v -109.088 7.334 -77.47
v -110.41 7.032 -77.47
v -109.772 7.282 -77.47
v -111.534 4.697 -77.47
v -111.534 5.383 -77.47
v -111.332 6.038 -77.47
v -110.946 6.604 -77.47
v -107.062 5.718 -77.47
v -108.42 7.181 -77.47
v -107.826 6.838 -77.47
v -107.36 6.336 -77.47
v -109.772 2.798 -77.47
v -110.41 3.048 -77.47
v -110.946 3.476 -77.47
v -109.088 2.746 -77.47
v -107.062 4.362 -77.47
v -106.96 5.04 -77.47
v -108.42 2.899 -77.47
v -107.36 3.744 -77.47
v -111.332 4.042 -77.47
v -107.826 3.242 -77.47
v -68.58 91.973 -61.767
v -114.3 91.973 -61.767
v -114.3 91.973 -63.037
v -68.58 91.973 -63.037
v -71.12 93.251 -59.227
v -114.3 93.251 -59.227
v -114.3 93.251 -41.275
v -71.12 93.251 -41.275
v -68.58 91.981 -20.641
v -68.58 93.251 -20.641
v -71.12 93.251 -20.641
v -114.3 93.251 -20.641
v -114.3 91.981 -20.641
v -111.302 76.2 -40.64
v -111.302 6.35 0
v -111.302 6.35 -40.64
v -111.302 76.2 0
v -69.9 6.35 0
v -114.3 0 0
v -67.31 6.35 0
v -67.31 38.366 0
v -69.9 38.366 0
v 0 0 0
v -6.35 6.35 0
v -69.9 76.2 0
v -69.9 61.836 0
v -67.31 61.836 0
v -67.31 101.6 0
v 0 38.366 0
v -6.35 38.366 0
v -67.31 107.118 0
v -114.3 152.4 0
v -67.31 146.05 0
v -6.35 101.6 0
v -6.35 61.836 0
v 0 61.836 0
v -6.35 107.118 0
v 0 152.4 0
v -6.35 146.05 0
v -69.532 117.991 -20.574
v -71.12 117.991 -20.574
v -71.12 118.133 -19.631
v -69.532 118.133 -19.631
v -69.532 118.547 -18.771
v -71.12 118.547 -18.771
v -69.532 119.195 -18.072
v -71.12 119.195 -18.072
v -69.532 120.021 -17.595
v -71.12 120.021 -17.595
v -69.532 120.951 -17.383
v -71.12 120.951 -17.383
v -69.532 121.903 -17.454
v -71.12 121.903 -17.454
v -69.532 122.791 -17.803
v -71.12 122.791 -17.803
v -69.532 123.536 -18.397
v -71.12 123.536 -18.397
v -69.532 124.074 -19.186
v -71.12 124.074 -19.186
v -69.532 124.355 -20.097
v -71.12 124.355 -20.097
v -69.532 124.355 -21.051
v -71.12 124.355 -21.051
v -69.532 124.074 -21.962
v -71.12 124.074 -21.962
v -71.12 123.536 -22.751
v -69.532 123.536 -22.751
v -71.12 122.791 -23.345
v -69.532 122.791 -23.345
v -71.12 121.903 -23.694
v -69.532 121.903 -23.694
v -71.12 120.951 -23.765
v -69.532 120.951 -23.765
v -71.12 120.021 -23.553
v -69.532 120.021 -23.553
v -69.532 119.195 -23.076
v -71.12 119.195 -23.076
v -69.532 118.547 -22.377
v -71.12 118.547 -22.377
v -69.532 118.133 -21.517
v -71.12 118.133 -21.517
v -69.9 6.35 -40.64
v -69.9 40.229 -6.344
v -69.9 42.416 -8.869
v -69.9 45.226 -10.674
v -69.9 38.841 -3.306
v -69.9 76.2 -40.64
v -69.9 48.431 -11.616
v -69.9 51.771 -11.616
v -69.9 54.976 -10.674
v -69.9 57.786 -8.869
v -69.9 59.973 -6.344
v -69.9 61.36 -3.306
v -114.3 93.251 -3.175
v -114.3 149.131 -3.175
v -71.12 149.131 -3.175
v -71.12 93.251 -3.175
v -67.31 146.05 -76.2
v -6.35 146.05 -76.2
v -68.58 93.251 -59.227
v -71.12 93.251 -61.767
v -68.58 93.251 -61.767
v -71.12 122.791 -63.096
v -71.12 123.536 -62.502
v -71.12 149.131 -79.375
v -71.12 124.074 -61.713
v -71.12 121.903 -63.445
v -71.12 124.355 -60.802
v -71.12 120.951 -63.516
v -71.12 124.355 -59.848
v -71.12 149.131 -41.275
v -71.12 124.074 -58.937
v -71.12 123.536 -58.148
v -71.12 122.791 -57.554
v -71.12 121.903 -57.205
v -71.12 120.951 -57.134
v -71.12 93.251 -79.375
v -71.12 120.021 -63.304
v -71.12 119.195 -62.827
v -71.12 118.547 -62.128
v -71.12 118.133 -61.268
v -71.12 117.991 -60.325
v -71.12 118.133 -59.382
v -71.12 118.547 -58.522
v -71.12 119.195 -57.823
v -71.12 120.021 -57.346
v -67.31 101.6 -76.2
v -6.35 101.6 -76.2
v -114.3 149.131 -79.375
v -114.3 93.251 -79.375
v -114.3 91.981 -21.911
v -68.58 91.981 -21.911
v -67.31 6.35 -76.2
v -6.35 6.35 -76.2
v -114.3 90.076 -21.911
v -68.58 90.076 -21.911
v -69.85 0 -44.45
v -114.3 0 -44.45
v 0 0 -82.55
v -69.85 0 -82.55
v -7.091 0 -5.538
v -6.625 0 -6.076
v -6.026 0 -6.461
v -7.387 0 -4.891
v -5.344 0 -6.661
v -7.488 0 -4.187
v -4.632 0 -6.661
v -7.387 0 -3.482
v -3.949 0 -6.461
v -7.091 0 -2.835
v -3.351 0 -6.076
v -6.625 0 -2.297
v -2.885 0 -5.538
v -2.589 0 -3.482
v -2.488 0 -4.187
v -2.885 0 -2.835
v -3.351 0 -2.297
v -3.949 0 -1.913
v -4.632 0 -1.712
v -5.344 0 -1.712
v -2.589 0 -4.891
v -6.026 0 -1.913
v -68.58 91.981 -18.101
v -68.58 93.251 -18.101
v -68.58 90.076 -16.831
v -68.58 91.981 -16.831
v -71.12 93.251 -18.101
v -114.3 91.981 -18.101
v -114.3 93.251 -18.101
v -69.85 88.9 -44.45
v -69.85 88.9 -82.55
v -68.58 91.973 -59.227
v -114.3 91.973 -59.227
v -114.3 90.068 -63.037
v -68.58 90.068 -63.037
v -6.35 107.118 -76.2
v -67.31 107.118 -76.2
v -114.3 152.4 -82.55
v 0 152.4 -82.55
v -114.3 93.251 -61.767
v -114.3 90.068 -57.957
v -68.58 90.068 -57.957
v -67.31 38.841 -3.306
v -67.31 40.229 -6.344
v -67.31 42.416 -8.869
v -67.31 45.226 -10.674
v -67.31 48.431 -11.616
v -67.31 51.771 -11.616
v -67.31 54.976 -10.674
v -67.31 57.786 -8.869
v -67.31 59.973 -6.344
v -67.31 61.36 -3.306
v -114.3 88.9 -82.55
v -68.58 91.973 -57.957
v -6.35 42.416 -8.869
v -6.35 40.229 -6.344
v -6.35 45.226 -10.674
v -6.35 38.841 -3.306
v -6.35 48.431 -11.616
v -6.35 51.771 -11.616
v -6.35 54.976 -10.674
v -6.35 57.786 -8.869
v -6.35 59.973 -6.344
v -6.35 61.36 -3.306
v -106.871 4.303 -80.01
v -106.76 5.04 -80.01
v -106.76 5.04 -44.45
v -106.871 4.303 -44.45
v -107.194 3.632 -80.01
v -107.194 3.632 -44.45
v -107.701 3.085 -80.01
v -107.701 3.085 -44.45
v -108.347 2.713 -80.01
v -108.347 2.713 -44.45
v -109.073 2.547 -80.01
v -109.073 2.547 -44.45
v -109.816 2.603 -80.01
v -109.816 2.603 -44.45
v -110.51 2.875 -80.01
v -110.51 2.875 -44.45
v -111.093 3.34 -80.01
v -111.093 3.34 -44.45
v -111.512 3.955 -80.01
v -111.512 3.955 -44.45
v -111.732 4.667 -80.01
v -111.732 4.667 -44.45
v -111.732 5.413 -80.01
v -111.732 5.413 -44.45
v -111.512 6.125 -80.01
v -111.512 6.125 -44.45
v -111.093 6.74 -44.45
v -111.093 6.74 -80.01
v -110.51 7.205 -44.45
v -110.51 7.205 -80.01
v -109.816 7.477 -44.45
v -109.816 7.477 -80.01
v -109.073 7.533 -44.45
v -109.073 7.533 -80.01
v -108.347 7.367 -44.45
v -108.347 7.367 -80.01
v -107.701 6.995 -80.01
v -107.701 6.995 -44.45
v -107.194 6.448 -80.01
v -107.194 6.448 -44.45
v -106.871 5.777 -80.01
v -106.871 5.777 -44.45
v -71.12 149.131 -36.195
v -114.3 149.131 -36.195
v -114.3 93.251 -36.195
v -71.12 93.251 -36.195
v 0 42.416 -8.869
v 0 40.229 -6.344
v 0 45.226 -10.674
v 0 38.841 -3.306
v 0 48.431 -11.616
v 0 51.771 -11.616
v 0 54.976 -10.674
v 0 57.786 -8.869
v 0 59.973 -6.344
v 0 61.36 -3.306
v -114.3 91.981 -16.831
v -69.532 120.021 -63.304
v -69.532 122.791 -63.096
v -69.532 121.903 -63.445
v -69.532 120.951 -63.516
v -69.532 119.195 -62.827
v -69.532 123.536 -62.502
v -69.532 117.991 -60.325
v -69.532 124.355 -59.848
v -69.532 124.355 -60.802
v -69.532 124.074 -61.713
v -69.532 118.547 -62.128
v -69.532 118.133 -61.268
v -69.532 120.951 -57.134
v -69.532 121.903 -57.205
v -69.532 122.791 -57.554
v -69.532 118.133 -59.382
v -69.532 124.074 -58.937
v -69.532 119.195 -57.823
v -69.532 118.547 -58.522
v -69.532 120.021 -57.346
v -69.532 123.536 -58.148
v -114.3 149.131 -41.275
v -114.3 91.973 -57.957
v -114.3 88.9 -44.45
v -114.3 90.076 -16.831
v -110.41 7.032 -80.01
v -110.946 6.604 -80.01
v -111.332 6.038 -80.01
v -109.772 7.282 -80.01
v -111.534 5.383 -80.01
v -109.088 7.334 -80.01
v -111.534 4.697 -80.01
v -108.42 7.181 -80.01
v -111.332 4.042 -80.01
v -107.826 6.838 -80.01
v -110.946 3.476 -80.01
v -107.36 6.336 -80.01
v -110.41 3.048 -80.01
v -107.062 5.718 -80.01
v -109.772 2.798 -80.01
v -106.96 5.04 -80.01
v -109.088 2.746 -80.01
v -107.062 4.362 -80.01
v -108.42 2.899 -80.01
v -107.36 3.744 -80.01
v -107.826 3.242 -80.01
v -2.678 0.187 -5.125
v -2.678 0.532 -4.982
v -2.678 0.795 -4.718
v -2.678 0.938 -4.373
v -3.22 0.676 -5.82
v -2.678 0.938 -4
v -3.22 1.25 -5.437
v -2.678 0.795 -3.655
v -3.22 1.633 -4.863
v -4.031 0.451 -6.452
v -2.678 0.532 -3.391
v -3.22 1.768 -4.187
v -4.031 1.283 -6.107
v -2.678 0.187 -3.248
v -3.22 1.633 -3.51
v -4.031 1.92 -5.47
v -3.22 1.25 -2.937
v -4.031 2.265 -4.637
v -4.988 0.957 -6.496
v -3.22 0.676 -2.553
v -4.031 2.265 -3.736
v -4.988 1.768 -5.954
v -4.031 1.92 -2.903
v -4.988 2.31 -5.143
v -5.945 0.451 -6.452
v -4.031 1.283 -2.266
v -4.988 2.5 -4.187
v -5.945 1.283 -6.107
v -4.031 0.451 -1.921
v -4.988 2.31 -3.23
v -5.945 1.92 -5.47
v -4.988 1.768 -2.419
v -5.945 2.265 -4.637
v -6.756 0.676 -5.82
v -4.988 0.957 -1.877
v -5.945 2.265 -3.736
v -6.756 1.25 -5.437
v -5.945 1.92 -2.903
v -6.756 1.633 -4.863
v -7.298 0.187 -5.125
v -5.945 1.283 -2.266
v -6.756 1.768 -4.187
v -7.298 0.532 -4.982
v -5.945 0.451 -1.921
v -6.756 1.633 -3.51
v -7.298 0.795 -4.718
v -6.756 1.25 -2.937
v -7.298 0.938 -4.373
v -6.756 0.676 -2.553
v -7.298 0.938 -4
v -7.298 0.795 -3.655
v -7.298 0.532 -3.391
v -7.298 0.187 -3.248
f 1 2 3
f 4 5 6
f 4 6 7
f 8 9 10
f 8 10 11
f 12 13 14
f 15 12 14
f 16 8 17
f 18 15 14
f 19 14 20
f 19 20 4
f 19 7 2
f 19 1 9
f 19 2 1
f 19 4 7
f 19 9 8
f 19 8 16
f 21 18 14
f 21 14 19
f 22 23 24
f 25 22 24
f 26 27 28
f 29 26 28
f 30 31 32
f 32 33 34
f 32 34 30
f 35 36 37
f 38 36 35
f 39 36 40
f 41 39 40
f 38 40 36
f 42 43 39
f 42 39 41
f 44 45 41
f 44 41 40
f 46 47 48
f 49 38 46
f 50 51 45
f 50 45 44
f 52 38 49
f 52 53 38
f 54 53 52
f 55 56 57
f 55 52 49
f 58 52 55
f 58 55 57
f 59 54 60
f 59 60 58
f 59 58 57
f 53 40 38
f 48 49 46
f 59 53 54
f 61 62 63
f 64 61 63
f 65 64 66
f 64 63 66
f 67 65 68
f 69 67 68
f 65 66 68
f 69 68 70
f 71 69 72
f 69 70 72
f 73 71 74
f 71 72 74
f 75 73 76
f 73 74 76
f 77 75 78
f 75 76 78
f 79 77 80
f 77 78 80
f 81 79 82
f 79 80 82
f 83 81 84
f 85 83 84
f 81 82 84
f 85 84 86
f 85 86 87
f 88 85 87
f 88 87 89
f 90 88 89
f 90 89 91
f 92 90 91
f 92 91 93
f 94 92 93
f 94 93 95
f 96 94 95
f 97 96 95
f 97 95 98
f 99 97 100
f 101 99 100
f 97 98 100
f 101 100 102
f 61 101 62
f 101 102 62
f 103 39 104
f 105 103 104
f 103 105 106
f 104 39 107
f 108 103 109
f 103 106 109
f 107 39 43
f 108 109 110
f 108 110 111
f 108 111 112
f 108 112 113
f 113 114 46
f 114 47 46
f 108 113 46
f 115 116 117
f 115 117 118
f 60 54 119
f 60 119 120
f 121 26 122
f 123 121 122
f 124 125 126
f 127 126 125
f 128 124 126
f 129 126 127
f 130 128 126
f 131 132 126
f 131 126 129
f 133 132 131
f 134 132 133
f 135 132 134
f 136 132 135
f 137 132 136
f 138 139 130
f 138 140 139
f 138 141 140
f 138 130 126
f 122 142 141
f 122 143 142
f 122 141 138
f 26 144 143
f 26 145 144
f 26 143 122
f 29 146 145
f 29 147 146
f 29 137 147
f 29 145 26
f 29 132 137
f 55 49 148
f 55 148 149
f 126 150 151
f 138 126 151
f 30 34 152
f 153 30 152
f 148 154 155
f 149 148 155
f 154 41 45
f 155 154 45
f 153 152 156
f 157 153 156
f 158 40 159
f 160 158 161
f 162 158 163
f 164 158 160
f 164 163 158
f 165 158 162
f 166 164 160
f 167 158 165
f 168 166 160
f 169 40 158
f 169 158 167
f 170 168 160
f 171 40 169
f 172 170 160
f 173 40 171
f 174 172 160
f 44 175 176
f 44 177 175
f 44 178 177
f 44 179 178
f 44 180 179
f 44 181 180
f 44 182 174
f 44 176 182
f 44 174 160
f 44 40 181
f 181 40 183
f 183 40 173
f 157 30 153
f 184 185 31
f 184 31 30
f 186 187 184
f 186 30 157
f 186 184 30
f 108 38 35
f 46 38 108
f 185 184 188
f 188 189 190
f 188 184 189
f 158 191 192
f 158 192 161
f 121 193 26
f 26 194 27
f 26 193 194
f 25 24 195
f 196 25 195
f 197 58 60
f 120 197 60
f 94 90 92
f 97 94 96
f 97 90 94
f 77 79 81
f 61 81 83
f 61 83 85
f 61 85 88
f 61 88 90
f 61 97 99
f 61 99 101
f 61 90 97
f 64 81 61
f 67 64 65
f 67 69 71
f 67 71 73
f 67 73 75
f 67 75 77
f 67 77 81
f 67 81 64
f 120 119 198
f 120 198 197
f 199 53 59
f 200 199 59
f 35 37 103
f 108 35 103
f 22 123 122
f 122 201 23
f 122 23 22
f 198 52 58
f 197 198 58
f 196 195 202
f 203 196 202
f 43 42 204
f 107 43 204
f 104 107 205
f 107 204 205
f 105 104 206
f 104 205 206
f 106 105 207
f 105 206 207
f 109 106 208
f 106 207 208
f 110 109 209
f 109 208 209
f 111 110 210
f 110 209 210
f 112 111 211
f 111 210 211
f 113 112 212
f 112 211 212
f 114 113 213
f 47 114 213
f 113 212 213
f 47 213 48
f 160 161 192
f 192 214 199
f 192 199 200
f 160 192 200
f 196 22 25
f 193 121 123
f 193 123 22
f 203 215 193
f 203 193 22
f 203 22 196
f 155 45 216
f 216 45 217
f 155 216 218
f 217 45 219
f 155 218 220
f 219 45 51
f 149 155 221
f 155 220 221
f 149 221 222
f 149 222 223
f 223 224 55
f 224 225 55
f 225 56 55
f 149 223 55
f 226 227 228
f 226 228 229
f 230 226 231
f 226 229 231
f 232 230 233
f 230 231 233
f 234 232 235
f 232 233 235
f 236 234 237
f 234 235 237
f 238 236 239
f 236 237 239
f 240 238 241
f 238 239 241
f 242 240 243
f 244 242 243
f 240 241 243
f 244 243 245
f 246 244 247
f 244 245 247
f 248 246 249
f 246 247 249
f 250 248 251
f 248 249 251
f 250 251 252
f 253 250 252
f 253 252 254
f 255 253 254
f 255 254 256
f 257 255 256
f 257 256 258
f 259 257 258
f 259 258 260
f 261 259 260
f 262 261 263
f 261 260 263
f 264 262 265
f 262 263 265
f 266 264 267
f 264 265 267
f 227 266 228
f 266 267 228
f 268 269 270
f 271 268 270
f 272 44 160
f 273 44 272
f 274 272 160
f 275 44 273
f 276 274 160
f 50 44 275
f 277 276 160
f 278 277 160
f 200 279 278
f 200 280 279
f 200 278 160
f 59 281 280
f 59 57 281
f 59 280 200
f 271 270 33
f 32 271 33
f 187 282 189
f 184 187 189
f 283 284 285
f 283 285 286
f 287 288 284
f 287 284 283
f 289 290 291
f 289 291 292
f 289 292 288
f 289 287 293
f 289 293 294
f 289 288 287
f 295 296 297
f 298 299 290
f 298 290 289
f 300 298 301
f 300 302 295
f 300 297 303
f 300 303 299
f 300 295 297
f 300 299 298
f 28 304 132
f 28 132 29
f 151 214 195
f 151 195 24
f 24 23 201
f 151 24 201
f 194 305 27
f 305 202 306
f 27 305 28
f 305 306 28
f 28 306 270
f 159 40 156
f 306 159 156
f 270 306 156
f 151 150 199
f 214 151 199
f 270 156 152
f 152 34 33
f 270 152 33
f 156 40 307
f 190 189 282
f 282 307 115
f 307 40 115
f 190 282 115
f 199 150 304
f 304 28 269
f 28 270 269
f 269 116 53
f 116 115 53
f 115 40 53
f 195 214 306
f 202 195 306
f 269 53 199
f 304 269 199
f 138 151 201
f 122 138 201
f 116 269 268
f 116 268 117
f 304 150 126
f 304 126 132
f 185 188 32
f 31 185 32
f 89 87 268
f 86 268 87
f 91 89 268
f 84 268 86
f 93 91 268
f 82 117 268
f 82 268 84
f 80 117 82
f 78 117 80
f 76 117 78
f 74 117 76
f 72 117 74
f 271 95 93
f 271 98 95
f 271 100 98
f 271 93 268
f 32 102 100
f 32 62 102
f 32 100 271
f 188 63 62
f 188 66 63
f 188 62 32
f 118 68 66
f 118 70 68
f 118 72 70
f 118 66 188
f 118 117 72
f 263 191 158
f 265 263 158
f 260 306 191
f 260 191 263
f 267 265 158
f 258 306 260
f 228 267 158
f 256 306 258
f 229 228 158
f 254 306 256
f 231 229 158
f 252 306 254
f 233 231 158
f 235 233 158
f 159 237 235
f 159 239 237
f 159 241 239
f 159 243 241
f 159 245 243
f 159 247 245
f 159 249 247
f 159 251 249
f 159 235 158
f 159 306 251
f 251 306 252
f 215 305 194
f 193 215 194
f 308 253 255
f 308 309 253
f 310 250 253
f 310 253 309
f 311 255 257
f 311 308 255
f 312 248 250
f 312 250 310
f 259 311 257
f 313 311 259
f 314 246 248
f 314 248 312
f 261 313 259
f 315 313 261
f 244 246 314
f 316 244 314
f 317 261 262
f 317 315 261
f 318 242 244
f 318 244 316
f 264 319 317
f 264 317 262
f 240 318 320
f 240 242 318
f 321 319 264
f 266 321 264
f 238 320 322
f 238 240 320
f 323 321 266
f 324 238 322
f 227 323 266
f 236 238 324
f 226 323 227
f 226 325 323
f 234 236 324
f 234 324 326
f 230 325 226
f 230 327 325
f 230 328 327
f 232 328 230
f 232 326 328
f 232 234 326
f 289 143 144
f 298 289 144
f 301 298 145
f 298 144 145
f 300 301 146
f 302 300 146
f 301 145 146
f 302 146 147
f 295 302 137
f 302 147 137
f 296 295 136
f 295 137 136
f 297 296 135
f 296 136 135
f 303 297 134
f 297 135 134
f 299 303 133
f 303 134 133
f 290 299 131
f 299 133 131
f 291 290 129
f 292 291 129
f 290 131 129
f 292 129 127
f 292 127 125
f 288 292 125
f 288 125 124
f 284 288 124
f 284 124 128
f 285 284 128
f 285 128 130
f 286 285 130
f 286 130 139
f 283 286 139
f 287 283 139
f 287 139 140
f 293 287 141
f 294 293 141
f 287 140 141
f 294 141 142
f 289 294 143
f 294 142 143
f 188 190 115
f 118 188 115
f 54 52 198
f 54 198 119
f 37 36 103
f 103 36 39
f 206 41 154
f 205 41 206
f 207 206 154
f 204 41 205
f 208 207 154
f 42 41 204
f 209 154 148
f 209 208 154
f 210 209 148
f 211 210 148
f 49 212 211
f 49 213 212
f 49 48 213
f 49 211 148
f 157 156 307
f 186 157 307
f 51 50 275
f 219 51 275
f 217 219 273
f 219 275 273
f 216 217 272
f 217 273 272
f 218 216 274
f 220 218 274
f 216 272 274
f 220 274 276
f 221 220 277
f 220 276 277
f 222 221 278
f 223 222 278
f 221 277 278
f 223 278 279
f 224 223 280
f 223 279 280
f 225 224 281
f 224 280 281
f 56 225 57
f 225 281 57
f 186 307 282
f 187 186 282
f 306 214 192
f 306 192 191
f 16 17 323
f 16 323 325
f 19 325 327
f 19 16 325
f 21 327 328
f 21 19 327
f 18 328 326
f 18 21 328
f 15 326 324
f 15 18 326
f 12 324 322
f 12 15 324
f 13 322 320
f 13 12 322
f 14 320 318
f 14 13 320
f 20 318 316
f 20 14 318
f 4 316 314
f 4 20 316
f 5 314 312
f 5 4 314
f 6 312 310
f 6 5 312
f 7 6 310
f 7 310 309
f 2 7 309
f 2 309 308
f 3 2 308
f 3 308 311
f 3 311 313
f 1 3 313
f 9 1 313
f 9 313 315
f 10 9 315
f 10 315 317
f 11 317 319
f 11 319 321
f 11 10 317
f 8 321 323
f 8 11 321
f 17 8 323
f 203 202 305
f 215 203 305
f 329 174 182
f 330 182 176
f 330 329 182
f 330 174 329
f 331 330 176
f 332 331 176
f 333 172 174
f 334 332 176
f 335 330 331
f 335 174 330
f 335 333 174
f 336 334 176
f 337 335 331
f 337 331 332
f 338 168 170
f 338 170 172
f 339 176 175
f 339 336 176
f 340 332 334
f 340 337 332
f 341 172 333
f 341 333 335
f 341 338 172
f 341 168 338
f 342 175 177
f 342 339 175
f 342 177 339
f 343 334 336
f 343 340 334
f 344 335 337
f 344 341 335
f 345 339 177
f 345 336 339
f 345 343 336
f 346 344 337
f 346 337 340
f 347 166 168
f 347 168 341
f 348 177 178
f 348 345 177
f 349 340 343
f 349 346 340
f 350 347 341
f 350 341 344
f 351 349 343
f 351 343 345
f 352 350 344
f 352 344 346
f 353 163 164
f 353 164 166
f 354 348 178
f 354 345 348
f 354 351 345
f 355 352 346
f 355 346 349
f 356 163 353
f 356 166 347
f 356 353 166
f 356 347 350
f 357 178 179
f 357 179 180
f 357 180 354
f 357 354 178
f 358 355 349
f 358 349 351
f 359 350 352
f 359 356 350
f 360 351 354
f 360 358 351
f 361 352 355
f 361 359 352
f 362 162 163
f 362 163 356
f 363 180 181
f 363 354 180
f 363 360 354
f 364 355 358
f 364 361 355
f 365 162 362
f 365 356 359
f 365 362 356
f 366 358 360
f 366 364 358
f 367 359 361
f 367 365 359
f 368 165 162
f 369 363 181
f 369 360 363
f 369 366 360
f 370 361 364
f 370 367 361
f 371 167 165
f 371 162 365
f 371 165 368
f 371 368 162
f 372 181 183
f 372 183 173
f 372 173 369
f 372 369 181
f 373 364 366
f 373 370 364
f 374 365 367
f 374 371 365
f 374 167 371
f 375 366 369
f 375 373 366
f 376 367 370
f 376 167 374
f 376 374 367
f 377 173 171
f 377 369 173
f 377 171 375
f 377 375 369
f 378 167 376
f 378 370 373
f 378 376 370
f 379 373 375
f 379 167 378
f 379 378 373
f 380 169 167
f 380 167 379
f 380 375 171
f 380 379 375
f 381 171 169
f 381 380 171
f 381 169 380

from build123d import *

# Parameters (mm, degrees)
F0_W      = 114.3
F0_H      = 152.4
F1_DEPTH  = 82.55
F2_W      = 60.96
F2_H      = 95.25
F3_DEPTH  = 76.2
F4_R      = 11.734963
F5_DEPTH  = 75.184
F6_W      = 60.96
F6_H      = 38.932147
F7_DEPTH  = 76.2
F8_W      = 88.9
F8_H      = 38.1
F9_DEPTH  = 44.45
F10_W     = 55.88
F10_H     = 33.02
F10_H_2   = 38.1
F11_DEPTH = 43.18
F12_R     = 2.5
F13_DEPTH = 33.02
F14_R     = 2.5
F14_R_2   = 2.3
F15_DEPTH = 2.54
F17_DEPTH = 45.72
F19_DEPTH = 45.72
F20_R     = 3.2
F21_DEPTH = 1.5875
F22_W     = 41.402
F22_H     = 69.85
F23_DEPTH = 40.64


with BuildPart() as f1:
    # F0 (on Top) → F1 (new body)
    with BuildSketch(Plane.XY):
        with Locations((-57.15, 76.2)):
            Rectangle(F0_W, F0_H)
    extrude(amount=-F1_DEPTH)

    # F2 (on face) → F3 (cut)
    with BuildSketch(Plane.XY):
        with Locations((-36.83, 53.975)):
            Rectangle(F2_W, F2_H)
    extrude(amount=-F3_DEPTH, mode=Mode.SUBTRACT)

    # F4 (on face) → F5 (cut)
    with BuildSketch(Plane.YZ):
        with Locations((50.100744, 0)):
            Circle(F4_R)
    extrude(amount=-F5_DEPTH, mode=Mode.SUBTRACT)

    # F6 (on face) → F7 (cut)
    with BuildSketch(Plane.XY):
        with Locations((-36.83, 126.583926)):
            Rectangle(F6_W, F6_H)
    extrude(amount=-F7_DEPTH, mode=Mode.SUBTRACT)

    # F8 (on face) → F9 (cut)
    with BuildSketch(Plane(origin=(-114.3, 0, 0), x_dir=(0, -1, 0), z_dir=(-1, 0, 0))):
        with Locations((-44.45, -63.5)):
            Rectangle(F8_W, F8_H)
    extrude(amount=-F9_DEPTH, mode=Mode.SUBTRACT)

    # F10 (on face) → F11 (cut)
    with BuildSketch(Plane(origin=(-114.3, 0, 0), x_dir=(0, -1, 0), z_dir=(-1, 0, 0))):
        with Locations((-121.190508, -19.685)):
            Rectangle(F10_W, F10_H)
        with Locations((-121.190508, -60.325)):
            Rectangle(F10_W, F10_H_2)
    extrude(amount=-F11_DEPTH, mode=Mode.SUBTRACT)

    # F12 (on face) → F13 (join)
    with BuildSketch(Plane(origin=(0, 0, -44.45), x_dir=(1, 0, 0), z_dir=(0, 0, -1))):
        with Locations((-109.26, -5.04)):
            Circle(F12_R)
    extrude(amount=F13_DEPTH)

    # F14 (on face) → F15 (join)
    with BuildSketch(Plane(origin=(0, 0, -77.47), x_dir=(1, 0, 0), z_dir=(0, 0, -1))):
        with Locations((-109.26, -5.04)):
            Circle(F14_R)
        with Locations((-109.26, -5.04)):
            Circle(F14_R_2, mode=Mode.SUBTRACT)
    extrude(amount=F15_DEPTH)

    # F16 (on face) → F17 (cut)
    with BuildSketch(Plane(origin=(-114.3, 0, 0), x_dir=(0, -1, 0), z_dir=(-1, 0, 0))):
        Polygon((-91.980508, -16.831285), (-91.980508, -18.101285), (-93.250508, -18.101285), (-93.250508, -20.641285), (-91.980508, -20.641285), (-91.980508, -21.911285), (-90.075508, -21.911285), (-90.075508, -16.831285), align=None)
    extrude(amount=-F17_DEPTH, mode=Mode.SUBTRACT)

    # F18 (on face) → F19 (cut)
    with BuildSketch(Plane(origin=(-114.3, 0, 0), x_dir=(0, -1, 0), z_dir=(-1, 0, 0))):
        Polygon((-91.973217, -57.956658), (-91.973217, -59.226658), (-93.250508, -59.226658), (-93.250508, -61.766658), (-91.973217, -61.766658), (-91.973217, -63.036658), (-90.068217, -63.036658), (-90.068217, -57.956658), align=None)
    extrude(amount=-F19_DEPTH, mode=Mode.SUBTRACT)

    # F20 (on face) → F21 (cut)
    with BuildSketch(Plane(origin=(-71.12, 0, 0), x_dir=(0, -1, 0), z_dir=(-1, 0, 0))):
        with Locations((-121.190508, -20.574)):
            Circle(F20_R)
        with Locations((-121.190508, -60.325)):
            Circle(F20_R)
    extrude(amount=-F21_DEPTH, mode=Mode.SUBTRACT)

    # F22 (on face) → F23 (cut)
    with BuildSketch(Plane.XY):
        with Locations((-90.600921, 41.275)):
            Rectangle(F22_W, F22_H)
    extrude(amount=-F23_DEPTH, mode=Mode.SUBTRACT)

    # F24 (on face) → F25 (revolve, cut)
    with BuildSketch(Plane.XZ):
        with BuildLine():
            Line((-7.48795, -4.186609), (-2.48795, -4.186609))
            ThreePointArc((-2.48795, -4.186609), (-4.98795, -1.686609), (-7.48795, -4.186609))
        make_face()
    revolve(axis=Axis((-4.98795, 0, -4.186609), (1, 0, 0)), mode=Mode.SUBTRACT)


solid = f1.part
